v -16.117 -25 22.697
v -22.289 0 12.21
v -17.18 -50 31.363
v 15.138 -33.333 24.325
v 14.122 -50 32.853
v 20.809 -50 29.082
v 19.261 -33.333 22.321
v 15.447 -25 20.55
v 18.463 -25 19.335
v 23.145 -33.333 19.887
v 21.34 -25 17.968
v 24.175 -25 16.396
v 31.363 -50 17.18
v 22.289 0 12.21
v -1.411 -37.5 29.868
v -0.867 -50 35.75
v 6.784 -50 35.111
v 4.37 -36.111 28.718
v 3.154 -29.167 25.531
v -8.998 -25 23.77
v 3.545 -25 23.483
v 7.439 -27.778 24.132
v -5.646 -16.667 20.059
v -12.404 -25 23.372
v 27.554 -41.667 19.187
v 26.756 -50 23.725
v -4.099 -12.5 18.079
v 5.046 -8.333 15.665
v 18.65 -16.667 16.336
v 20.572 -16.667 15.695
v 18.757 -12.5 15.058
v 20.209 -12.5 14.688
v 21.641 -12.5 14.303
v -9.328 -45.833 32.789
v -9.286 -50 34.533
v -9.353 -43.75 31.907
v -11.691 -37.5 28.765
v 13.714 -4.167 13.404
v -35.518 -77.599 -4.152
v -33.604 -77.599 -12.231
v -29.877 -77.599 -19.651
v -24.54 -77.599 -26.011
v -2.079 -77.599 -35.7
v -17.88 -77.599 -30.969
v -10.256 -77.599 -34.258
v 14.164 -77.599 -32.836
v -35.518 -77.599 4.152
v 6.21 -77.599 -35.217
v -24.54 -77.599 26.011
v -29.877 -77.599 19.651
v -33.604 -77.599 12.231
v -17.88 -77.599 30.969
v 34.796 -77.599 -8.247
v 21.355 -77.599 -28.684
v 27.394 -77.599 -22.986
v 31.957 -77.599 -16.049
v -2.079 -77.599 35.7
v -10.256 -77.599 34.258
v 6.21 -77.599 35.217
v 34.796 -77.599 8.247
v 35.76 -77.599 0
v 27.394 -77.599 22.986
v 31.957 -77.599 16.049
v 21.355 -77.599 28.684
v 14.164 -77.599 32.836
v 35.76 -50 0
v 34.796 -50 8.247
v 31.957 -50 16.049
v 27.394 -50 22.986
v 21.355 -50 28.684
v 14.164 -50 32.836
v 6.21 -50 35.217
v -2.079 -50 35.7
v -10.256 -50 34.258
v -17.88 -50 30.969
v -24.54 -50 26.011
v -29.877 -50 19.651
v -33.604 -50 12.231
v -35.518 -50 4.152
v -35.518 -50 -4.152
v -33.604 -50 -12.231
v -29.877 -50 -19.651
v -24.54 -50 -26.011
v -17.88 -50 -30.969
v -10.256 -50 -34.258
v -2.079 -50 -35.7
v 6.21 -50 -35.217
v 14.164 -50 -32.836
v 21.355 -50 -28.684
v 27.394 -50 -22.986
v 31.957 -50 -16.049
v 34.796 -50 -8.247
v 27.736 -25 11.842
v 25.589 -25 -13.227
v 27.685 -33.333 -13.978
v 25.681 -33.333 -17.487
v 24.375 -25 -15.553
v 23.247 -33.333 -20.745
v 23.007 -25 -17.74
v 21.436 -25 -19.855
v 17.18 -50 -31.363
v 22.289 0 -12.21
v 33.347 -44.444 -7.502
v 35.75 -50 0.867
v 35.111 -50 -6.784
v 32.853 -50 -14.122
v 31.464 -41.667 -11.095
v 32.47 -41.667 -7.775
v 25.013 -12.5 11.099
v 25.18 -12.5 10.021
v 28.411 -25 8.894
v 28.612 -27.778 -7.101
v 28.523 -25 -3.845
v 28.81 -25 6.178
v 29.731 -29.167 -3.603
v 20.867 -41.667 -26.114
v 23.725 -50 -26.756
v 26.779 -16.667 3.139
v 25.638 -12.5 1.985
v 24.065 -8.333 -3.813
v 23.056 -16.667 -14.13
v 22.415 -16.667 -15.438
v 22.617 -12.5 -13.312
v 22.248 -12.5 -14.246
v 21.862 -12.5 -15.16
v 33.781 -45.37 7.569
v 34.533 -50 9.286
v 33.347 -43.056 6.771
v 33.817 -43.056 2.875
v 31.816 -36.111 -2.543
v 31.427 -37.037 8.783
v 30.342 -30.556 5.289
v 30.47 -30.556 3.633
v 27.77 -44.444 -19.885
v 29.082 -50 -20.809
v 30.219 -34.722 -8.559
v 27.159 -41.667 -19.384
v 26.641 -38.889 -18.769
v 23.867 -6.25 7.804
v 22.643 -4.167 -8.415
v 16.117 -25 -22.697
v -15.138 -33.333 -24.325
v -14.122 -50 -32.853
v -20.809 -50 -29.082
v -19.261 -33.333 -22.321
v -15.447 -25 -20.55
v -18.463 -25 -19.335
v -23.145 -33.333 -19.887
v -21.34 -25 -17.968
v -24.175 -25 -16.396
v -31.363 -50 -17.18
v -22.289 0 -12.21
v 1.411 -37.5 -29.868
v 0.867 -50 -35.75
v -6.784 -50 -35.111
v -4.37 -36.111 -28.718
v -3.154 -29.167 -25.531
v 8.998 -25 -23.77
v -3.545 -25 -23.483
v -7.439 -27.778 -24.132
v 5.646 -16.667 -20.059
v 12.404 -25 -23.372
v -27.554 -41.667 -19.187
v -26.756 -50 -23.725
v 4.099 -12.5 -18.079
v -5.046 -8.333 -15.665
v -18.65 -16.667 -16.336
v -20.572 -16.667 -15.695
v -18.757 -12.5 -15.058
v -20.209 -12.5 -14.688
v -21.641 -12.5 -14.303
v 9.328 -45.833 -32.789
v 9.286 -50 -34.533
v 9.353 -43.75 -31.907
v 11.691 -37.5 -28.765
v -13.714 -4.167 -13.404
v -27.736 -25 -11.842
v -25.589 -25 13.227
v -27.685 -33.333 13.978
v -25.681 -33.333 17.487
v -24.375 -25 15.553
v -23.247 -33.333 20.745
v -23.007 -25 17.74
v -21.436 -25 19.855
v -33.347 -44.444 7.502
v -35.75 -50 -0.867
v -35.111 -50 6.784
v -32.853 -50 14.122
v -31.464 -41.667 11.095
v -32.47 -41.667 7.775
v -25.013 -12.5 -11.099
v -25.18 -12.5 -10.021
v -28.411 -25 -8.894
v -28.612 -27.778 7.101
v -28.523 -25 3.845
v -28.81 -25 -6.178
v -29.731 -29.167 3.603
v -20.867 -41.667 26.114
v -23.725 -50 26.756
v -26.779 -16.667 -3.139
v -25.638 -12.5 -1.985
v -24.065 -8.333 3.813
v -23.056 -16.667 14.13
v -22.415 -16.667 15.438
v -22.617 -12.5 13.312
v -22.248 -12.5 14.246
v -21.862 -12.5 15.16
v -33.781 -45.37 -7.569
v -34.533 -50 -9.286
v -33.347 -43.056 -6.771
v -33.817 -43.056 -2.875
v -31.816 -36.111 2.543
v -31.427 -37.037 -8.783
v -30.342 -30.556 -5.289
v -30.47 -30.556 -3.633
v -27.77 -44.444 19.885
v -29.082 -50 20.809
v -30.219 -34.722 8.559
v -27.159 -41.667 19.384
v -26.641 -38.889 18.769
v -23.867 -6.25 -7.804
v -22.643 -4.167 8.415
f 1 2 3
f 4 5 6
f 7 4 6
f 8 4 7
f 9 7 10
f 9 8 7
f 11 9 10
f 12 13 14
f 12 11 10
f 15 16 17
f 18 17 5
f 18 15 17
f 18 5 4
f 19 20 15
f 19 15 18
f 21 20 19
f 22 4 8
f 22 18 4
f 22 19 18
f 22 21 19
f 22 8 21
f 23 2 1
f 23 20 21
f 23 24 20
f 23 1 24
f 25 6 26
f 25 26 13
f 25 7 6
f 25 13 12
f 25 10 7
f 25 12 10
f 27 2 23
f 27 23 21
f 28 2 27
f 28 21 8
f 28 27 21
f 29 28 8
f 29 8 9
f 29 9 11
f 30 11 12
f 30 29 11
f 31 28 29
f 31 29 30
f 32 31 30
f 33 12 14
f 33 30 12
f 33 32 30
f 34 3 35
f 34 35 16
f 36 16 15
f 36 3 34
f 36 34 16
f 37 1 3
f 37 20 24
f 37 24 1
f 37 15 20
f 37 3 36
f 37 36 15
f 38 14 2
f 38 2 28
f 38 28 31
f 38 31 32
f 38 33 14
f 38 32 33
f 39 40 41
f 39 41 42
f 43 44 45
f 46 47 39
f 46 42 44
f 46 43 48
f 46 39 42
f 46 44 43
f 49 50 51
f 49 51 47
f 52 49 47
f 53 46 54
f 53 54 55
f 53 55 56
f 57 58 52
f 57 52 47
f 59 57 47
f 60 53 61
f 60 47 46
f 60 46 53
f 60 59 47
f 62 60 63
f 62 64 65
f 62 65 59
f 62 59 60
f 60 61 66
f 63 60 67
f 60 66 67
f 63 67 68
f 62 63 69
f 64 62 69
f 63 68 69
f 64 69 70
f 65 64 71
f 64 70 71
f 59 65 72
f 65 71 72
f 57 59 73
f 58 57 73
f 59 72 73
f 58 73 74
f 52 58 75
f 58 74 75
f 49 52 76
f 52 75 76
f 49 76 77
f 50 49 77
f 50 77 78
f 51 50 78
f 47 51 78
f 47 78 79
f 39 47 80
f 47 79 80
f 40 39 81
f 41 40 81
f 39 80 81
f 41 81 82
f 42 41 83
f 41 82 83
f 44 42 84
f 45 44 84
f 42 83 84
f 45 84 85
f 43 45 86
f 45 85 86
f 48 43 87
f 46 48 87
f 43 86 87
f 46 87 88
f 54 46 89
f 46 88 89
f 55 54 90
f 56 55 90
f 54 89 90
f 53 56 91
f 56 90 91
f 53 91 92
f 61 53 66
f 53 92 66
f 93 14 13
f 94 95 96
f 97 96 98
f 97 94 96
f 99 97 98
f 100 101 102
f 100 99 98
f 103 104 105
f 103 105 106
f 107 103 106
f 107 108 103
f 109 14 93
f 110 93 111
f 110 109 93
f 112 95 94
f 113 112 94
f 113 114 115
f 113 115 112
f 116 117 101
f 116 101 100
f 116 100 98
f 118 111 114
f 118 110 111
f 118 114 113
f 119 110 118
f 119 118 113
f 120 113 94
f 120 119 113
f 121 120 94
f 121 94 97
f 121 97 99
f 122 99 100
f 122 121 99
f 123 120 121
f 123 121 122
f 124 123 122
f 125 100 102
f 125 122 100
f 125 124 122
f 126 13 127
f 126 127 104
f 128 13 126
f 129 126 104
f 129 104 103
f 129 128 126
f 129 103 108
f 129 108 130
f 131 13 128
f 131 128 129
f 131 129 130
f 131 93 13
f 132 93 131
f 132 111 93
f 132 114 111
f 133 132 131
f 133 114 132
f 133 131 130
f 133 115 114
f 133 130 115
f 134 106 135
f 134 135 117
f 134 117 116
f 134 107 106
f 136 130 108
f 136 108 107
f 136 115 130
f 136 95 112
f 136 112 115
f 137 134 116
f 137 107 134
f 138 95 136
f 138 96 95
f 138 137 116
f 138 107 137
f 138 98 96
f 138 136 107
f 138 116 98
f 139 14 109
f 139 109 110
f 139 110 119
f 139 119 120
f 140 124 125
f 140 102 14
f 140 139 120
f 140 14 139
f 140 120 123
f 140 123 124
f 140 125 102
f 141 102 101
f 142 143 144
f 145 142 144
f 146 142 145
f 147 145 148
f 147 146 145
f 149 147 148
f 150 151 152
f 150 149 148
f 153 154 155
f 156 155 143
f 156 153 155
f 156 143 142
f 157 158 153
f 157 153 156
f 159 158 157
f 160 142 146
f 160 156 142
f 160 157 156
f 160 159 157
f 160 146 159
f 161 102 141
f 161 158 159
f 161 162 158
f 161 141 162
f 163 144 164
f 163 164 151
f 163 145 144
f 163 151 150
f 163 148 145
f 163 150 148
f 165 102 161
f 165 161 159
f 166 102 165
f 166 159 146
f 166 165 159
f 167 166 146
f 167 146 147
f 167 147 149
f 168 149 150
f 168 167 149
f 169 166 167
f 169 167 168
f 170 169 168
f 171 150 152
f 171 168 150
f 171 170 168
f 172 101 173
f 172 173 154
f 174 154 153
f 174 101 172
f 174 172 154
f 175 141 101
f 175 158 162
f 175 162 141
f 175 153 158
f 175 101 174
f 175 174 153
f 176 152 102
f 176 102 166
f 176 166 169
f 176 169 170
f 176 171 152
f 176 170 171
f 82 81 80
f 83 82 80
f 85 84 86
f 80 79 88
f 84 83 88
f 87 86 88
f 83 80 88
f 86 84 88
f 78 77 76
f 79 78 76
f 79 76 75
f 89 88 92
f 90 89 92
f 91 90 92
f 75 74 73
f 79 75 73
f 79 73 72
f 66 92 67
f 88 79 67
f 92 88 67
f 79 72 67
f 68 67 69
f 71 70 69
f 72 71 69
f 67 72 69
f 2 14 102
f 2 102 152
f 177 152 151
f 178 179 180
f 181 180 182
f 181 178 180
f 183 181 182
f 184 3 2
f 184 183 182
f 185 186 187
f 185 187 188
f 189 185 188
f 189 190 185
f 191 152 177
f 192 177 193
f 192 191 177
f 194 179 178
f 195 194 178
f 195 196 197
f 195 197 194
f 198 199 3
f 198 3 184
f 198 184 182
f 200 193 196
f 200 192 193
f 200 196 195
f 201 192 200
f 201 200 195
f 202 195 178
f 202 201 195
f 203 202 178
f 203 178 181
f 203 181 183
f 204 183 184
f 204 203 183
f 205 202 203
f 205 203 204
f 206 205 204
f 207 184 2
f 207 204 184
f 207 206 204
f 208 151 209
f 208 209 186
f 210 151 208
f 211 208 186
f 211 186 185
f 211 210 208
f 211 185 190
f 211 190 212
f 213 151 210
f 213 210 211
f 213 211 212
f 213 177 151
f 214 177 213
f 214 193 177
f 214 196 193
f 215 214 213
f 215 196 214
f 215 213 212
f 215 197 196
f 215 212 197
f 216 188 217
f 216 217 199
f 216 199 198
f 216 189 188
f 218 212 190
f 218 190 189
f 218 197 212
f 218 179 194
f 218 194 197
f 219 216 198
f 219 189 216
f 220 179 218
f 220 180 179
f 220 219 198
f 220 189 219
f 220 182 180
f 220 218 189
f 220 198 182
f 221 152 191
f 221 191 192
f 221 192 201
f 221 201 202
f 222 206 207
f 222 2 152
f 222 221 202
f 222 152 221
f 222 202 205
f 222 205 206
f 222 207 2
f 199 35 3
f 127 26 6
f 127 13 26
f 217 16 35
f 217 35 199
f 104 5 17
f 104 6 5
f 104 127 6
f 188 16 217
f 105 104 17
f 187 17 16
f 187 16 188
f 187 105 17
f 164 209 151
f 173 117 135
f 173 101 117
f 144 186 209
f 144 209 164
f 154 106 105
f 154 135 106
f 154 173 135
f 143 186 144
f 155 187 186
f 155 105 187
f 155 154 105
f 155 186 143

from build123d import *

# Parameters (mm, degrees)
F2_R     = 35.7602314712
F3_DEPTH = 27.59926
F0_W     = 44.5784255862
F0_H     = 24.4192462415


# Not quite as in the source:
# - the arcs of a loft's sections are written as splines that run evenly, so that the points pair up as in the source's solid


with BuildPart() as f3:
    # F2 (on offset) → F3 (new body)
    with BuildSketch(Plane.XZ.offset(50)):
        Circle(F2_R)
    extrude(amount=F3_DEPTH)


with BuildPart() as f4:
    # F3_face (on face) → F4 section 0
    with BuildSketch(Plane(origin=(0, -50, 0), x_dir=(1, 0, 0), z_dir=(0, 1, 0))):
        with BuildLine():
            add(Edge.make_bspline(
                [(31.3630160959, -17.1800866192), (32.4874501357, -15.1273820159), (33.4096876137, -12.9639838215), (34.8144187197, -8.4987265037), (35.2968776128, -6.1969777925), (35.8034887164, -1.5434696982), (35.8276283999, 0.8081746177), (35.4166507206, 5.4711017822), (34.9815435199, 7.7822693307), (33.6687706994, 12.2754218894), (32.7911375404, 14.4572957976), (30.627018702, 18.6080044175), (29.3405865347, 20.5767364947), (26.4082875517, 24.2254917713), (24.7624932428, 25.905424748), (21.1747007207, 28.9120070622), (19.2327912226, 30.2385820561), (17.1800866192, 31.3630160959)],
                knots=[0, 0, 0, 0, 0.125, 0.125, 0.25, 0.25, 0.375, 0.375, 0.5, 0.5, 0.625, 0.625, 0.75, 0.75, 0.875, 0.875, 1, 1, 1, 1], degree=3))
            add(Edge.make_bspline(
                [(17.1800866192, 31.3630160959), (15.1273820159, 32.4874501357), (12.9639838215, 33.4096876137), (8.4987265037, 34.8144187197), (6.1969777925, 35.2968776128), (1.5434696982, 35.8034887164), (-0.8081746177, 35.8276283999), (-5.4711017822, 35.4166507206), (-7.7822693307, 34.9815435199), (-12.2754218894, 33.6687706994), (-14.4572957976, 32.7911375404), (-18.6080044175, 30.627018702), (-20.5767364947, 29.3405865347), (-24.2254917713, 26.4082875517), (-25.905424748, 24.7624932428), (-28.9120070622, 21.1747007207), (-30.2385820561, 19.2327912226), (-31.3630160959, 17.1800866192)],
                knots=[0, 0, 0, 0, 0.125, 0.125, 0.25, 0.25, 0.375, 0.375, 0.5, 0.5, 0.625, 0.625, 0.75, 0.75, 0.875, 0.875, 1, 1, 1, 1], degree=3))
            add(Edge.make_bspline(
                [(-31.3630160959, 17.1800866192), (-32.4874501357, 15.1273820159), (-33.4096876137, 12.9639838215), (-34.8144187197, 8.4987265037), (-35.2968776128, 6.1969777925), (-35.8034887164, 1.5434696982), (-35.8276283999, -0.8081746177), (-35.4166507206, -5.4711017822), (-34.9815435199, -7.7822693307), (-33.6687706994, -12.2754218894), (-32.7911375404, -14.4572957976), (-30.627018702, -18.6080044175), (-29.3405865347, -20.5767364947), (-26.4082875517, -24.2254917713), (-24.7624932428, -25.905424748), (-21.1747007207, -28.9120070622), (-19.2327912226, -30.2385820561), (-17.1800866192, -31.3630160959)],
                knots=[0, 0, 0, 0, 0.125, 0.125, 0.25, 0.25, 0.375, 0.375, 0.5, 0.5, 0.625, 0.625, 0.75, 0.75, 0.875, 0.875, 1, 1, 1, 1], degree=3))
            add(Edge.make_bspline(
                [(-17.1800866192, -31.3630160959), (-15.1273820159, -32.4874501357), (-12.9639838215, -33.4096876137), (-8.4987265037, -34.8144187197), (-6.1969777925, -35.2968776128), (-1.5434696982, -35.8034887164), (0.8081746177, -35.8276283999), (5.4711017822, -35.4166507206), (7.7822693307, -34.9815435199), (12.2754218894, -33.6687706994), (14.4572957976, -32.7911375404), (18.6080044175, -30.627018702), (20.5767364947, -29.3405865347), (24.2254917713, -26.4082875517), (25.905424748, -24.7624932428), (28.9120070622, -21.1747007207), (30.2385820561, -19.2327912226), (31.3630160959, -17.1800866192)],
                knots=[0, 0, 0, 0, 0.125, 0.125, 0.25, 0.25, 0.375, 0.375, 0.5, 0.5, 0.625, 0.625, 0.75, 0.75, 0.875, 0.875, 1, 1, 1, 1], degree=3))
        make_face()
    # F0 (on Front) → F4 section 1
    with BuildSketch(Plane.XZ):
        Rectangle(F0_W, F0_H)
    loft(ruled=True)


solid = Compound([f3.part, f4.part])
